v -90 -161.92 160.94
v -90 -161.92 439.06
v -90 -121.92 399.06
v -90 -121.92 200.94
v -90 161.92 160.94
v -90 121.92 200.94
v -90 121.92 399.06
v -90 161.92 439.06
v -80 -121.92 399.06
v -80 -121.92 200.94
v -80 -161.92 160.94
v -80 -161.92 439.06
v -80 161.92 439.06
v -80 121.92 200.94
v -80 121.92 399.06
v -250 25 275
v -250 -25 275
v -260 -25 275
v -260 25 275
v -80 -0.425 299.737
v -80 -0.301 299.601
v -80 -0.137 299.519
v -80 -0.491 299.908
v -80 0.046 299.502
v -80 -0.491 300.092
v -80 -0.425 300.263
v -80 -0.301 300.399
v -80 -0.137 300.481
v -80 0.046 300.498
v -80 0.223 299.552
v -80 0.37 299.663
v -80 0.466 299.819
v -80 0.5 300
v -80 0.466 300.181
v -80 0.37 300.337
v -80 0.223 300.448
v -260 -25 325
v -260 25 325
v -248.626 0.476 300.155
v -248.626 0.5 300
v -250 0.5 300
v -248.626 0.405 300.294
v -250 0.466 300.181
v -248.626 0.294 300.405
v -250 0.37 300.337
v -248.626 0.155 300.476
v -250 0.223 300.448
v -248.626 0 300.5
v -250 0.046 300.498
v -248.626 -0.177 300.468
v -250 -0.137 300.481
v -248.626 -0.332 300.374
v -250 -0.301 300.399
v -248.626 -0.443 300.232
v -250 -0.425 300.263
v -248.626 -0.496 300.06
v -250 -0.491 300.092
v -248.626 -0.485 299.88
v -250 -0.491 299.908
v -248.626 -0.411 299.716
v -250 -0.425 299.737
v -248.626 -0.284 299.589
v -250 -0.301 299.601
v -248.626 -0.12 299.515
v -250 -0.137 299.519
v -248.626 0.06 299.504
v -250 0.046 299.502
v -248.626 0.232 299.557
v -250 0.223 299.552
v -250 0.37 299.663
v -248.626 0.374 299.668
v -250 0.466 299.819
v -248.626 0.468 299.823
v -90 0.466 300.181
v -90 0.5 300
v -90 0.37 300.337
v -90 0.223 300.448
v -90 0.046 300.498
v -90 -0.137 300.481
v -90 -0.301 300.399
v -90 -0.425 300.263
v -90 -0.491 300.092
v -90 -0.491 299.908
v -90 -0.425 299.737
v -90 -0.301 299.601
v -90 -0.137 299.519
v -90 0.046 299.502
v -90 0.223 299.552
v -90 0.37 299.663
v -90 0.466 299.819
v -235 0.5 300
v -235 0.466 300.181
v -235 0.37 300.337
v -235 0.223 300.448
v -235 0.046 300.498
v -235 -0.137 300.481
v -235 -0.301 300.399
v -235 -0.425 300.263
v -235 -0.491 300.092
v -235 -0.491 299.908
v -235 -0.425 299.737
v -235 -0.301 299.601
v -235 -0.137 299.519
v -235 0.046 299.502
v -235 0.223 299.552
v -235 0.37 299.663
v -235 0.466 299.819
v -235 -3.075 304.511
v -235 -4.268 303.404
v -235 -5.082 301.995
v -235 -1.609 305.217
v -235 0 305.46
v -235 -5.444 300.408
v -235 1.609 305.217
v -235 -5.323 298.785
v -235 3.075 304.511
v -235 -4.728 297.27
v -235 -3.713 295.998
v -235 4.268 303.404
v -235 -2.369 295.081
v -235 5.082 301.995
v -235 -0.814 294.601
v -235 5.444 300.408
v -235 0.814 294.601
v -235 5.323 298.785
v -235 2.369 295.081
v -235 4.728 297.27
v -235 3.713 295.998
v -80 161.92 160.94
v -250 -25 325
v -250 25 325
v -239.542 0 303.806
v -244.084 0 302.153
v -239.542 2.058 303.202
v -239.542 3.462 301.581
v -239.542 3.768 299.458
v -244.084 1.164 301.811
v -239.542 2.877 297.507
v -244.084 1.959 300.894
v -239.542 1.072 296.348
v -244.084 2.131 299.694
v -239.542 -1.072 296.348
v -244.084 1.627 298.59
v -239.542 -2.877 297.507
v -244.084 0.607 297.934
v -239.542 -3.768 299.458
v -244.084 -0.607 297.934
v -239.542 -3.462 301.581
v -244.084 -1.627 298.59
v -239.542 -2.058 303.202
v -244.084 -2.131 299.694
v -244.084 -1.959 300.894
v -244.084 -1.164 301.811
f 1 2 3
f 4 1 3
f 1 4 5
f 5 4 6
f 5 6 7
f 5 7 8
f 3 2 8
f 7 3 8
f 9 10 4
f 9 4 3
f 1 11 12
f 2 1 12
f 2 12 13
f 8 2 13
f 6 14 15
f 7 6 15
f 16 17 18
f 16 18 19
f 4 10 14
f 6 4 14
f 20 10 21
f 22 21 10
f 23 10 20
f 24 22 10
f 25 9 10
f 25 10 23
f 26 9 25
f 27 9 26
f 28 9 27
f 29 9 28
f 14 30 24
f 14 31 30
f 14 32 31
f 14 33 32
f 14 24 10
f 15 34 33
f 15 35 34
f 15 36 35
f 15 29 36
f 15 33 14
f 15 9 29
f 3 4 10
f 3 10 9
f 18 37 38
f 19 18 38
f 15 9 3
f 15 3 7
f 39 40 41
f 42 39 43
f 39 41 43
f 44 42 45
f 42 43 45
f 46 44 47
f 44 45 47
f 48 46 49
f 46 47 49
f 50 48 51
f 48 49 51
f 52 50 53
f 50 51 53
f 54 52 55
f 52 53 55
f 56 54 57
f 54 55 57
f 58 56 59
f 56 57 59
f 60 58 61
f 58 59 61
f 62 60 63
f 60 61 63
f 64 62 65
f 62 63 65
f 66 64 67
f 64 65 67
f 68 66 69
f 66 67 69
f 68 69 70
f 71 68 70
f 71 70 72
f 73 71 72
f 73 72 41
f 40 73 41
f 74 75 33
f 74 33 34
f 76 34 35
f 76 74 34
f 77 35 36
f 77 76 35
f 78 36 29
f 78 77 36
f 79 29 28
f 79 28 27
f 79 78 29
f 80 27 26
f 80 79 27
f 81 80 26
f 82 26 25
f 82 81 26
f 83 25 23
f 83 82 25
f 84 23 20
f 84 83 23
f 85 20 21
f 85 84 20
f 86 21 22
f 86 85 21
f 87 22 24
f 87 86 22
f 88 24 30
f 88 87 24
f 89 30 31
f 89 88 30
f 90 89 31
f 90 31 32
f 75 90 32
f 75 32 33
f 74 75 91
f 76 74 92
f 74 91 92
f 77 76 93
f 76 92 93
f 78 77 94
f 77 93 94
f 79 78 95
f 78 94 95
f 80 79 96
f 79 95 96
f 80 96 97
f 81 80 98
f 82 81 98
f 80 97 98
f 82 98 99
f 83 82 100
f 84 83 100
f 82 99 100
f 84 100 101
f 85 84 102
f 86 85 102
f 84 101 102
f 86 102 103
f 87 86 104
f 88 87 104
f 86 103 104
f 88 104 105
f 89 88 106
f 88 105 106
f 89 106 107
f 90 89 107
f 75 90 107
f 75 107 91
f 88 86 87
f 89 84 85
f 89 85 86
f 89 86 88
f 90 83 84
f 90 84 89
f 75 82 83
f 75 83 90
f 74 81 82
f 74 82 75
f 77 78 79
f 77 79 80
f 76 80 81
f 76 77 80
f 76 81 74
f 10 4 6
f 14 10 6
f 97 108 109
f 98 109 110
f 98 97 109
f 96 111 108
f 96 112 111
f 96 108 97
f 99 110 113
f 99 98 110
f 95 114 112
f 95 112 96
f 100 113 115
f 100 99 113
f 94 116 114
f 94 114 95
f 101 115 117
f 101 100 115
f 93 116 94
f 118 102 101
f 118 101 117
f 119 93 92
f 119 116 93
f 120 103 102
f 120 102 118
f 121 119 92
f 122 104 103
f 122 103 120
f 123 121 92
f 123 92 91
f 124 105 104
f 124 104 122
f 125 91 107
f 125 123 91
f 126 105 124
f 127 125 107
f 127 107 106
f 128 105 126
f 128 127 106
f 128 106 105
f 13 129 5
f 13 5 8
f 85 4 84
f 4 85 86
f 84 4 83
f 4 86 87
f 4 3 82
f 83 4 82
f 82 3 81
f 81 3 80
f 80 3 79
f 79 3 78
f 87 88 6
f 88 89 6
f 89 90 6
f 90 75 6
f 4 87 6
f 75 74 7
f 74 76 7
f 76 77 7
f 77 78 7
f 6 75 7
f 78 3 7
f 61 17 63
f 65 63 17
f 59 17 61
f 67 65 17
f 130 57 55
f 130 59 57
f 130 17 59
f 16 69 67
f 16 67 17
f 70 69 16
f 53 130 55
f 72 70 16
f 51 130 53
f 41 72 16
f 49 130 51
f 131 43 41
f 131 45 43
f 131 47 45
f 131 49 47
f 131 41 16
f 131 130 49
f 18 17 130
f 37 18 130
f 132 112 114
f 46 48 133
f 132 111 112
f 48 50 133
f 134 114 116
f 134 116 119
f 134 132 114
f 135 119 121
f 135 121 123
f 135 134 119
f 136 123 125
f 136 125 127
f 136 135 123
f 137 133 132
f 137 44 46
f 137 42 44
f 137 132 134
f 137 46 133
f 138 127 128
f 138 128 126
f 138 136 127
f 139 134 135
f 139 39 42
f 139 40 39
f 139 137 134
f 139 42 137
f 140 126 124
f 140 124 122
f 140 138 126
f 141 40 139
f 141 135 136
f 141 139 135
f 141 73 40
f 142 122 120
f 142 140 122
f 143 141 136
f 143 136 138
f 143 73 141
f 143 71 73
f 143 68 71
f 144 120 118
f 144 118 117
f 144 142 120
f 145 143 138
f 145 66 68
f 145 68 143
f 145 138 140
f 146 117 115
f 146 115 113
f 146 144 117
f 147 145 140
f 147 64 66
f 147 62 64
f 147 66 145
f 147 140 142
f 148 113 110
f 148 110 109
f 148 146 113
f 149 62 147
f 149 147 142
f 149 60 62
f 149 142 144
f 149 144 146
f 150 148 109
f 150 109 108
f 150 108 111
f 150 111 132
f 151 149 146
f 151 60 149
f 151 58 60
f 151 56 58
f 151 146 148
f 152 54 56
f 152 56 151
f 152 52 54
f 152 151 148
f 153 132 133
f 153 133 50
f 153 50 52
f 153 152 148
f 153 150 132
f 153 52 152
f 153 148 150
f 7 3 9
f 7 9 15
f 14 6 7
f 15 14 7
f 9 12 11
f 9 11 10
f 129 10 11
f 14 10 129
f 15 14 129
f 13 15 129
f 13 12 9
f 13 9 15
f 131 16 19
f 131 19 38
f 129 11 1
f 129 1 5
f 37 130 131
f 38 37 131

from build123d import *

# Parameters (mm, degrees)
F0_W      = 700
F0_H      = 700
F1_DEPTH  = 70
F2_R      = 285.1890902305
F3_DEPTH  = 10
F4_R      = 219.196638876
F5_DEPTH  = 25
F6_R      = 146.5573641712
F7_DEPTH  = 25
F9_W      = 50
F9_H      = 50
F10_DEPTH = 10
F11_R     = 0.5
F12_DEPTH = 160
F13_SIZE  = 5
F14_R     = 2
F18_W     = 243.84
F18_H     = 198.12
F18_R     = 0.5
F19_DEPTH = 10
F20_W     = 323.84
F20_H     = 278.12
F20_W_2   = 243.84
F20_H_2   = 198.12
F21_DEPTH = 10


with BuildPart() as f1:
    # F0 (on Top) → F1 (new body)
    with BuildSketch(Plane.XY):
        Rectangle(F0_W, F0_H)
    extrude(amount=-F1_DEPTH)

    # F2 (on face) → F3 (join)
    with BuildSketch(Plane.XY):
        Circle(F2_R)
    extrude(amount=F3_DEPTH)

    # F4 (on face) → F5 (join)
    with BuildSketch(Plane.XY.offset(10)):
        Circle(F4_R)
    extrude(amount=F5_DEPTH)

    # F6 (on face) → F7 (join)
    with BuildSketch(Plane.XY.offset(35)):
        Circle(F6_R)
    extrude(amount=F7_DEPTH)

    # F13
    f13_edges = [f1.edges().sort_by_distance(p)[0] for p in [
        (-146.557364, 0, 60),
        (-219.196639, 0, 35),
        (-285.18909, 0, 10),
    ]]
    chamfer(f13_edges, length=F13_SIZE)

    # F14
    f14_edges = [f1.edges().sort_by_distance(p)[0] for p in [
        (0, -350, 0),
        (0, 350, 0),
        (350, 0, 0),
        (-350, 0, 0),
        (-285.18909, 0, 0),
    ]]
    fillet(f14_edges, radius=F14_R)


with BuildPart() as f10:
    # F9 (on offset) → F10 (new body)
    with BuildSketch(Plane.YZ.offset(-250)):
        with Locations((0, 300)):
            Rectangle(F9_W, F9_H)
    extrude(amount=-F10_DEPTH)

    # F11 (on face) → F12 (join)
    with BuildSketch(Plane.YZ.offset(-250)):
        with Locations((0, 300)):
            Circle(F11_R)
    extrude(amount=F12_DEPTH)

    # F15 (on Front) → F16 (revolve)
    with BuildSketch(Plane.XZ):
        Polygon((-235, 305.459553514), (-250, 300), (-235, 300), align=None)
    revolve(axis=Axis((-242.5, 0, 300), (-1, 0, 0)))


with BuildPart() as f19:
    # F18 (on face) → F19 (new body)
    with BuildSketch(Plane.YZ.offset(-90)):
        with Locations((0, 300)):
            Rectangle(F18_W, F18_H)
        with Locations((0, 300)):
            Circle(F18_R, mode=Mode.SUBTRACT)
    extrude(amount=F19_DEPTH)


with BuildPart() as f21:
    # F20 (on face) → F21 (new body, through all)
    with BuildSketch(Plane.YZ.offset(-80)):
        with Locations((0, 300)):
            Rectangle(F20_W, F20_H)
        with Locations((0, 300)):
            Rectangle(F20_W_2, F20_H_2, mode=Mode.SUBTRACT)
    extrude(amount=-F21_DEPTH)


solid = Compound([f10.part, f19.part, f21.part])
